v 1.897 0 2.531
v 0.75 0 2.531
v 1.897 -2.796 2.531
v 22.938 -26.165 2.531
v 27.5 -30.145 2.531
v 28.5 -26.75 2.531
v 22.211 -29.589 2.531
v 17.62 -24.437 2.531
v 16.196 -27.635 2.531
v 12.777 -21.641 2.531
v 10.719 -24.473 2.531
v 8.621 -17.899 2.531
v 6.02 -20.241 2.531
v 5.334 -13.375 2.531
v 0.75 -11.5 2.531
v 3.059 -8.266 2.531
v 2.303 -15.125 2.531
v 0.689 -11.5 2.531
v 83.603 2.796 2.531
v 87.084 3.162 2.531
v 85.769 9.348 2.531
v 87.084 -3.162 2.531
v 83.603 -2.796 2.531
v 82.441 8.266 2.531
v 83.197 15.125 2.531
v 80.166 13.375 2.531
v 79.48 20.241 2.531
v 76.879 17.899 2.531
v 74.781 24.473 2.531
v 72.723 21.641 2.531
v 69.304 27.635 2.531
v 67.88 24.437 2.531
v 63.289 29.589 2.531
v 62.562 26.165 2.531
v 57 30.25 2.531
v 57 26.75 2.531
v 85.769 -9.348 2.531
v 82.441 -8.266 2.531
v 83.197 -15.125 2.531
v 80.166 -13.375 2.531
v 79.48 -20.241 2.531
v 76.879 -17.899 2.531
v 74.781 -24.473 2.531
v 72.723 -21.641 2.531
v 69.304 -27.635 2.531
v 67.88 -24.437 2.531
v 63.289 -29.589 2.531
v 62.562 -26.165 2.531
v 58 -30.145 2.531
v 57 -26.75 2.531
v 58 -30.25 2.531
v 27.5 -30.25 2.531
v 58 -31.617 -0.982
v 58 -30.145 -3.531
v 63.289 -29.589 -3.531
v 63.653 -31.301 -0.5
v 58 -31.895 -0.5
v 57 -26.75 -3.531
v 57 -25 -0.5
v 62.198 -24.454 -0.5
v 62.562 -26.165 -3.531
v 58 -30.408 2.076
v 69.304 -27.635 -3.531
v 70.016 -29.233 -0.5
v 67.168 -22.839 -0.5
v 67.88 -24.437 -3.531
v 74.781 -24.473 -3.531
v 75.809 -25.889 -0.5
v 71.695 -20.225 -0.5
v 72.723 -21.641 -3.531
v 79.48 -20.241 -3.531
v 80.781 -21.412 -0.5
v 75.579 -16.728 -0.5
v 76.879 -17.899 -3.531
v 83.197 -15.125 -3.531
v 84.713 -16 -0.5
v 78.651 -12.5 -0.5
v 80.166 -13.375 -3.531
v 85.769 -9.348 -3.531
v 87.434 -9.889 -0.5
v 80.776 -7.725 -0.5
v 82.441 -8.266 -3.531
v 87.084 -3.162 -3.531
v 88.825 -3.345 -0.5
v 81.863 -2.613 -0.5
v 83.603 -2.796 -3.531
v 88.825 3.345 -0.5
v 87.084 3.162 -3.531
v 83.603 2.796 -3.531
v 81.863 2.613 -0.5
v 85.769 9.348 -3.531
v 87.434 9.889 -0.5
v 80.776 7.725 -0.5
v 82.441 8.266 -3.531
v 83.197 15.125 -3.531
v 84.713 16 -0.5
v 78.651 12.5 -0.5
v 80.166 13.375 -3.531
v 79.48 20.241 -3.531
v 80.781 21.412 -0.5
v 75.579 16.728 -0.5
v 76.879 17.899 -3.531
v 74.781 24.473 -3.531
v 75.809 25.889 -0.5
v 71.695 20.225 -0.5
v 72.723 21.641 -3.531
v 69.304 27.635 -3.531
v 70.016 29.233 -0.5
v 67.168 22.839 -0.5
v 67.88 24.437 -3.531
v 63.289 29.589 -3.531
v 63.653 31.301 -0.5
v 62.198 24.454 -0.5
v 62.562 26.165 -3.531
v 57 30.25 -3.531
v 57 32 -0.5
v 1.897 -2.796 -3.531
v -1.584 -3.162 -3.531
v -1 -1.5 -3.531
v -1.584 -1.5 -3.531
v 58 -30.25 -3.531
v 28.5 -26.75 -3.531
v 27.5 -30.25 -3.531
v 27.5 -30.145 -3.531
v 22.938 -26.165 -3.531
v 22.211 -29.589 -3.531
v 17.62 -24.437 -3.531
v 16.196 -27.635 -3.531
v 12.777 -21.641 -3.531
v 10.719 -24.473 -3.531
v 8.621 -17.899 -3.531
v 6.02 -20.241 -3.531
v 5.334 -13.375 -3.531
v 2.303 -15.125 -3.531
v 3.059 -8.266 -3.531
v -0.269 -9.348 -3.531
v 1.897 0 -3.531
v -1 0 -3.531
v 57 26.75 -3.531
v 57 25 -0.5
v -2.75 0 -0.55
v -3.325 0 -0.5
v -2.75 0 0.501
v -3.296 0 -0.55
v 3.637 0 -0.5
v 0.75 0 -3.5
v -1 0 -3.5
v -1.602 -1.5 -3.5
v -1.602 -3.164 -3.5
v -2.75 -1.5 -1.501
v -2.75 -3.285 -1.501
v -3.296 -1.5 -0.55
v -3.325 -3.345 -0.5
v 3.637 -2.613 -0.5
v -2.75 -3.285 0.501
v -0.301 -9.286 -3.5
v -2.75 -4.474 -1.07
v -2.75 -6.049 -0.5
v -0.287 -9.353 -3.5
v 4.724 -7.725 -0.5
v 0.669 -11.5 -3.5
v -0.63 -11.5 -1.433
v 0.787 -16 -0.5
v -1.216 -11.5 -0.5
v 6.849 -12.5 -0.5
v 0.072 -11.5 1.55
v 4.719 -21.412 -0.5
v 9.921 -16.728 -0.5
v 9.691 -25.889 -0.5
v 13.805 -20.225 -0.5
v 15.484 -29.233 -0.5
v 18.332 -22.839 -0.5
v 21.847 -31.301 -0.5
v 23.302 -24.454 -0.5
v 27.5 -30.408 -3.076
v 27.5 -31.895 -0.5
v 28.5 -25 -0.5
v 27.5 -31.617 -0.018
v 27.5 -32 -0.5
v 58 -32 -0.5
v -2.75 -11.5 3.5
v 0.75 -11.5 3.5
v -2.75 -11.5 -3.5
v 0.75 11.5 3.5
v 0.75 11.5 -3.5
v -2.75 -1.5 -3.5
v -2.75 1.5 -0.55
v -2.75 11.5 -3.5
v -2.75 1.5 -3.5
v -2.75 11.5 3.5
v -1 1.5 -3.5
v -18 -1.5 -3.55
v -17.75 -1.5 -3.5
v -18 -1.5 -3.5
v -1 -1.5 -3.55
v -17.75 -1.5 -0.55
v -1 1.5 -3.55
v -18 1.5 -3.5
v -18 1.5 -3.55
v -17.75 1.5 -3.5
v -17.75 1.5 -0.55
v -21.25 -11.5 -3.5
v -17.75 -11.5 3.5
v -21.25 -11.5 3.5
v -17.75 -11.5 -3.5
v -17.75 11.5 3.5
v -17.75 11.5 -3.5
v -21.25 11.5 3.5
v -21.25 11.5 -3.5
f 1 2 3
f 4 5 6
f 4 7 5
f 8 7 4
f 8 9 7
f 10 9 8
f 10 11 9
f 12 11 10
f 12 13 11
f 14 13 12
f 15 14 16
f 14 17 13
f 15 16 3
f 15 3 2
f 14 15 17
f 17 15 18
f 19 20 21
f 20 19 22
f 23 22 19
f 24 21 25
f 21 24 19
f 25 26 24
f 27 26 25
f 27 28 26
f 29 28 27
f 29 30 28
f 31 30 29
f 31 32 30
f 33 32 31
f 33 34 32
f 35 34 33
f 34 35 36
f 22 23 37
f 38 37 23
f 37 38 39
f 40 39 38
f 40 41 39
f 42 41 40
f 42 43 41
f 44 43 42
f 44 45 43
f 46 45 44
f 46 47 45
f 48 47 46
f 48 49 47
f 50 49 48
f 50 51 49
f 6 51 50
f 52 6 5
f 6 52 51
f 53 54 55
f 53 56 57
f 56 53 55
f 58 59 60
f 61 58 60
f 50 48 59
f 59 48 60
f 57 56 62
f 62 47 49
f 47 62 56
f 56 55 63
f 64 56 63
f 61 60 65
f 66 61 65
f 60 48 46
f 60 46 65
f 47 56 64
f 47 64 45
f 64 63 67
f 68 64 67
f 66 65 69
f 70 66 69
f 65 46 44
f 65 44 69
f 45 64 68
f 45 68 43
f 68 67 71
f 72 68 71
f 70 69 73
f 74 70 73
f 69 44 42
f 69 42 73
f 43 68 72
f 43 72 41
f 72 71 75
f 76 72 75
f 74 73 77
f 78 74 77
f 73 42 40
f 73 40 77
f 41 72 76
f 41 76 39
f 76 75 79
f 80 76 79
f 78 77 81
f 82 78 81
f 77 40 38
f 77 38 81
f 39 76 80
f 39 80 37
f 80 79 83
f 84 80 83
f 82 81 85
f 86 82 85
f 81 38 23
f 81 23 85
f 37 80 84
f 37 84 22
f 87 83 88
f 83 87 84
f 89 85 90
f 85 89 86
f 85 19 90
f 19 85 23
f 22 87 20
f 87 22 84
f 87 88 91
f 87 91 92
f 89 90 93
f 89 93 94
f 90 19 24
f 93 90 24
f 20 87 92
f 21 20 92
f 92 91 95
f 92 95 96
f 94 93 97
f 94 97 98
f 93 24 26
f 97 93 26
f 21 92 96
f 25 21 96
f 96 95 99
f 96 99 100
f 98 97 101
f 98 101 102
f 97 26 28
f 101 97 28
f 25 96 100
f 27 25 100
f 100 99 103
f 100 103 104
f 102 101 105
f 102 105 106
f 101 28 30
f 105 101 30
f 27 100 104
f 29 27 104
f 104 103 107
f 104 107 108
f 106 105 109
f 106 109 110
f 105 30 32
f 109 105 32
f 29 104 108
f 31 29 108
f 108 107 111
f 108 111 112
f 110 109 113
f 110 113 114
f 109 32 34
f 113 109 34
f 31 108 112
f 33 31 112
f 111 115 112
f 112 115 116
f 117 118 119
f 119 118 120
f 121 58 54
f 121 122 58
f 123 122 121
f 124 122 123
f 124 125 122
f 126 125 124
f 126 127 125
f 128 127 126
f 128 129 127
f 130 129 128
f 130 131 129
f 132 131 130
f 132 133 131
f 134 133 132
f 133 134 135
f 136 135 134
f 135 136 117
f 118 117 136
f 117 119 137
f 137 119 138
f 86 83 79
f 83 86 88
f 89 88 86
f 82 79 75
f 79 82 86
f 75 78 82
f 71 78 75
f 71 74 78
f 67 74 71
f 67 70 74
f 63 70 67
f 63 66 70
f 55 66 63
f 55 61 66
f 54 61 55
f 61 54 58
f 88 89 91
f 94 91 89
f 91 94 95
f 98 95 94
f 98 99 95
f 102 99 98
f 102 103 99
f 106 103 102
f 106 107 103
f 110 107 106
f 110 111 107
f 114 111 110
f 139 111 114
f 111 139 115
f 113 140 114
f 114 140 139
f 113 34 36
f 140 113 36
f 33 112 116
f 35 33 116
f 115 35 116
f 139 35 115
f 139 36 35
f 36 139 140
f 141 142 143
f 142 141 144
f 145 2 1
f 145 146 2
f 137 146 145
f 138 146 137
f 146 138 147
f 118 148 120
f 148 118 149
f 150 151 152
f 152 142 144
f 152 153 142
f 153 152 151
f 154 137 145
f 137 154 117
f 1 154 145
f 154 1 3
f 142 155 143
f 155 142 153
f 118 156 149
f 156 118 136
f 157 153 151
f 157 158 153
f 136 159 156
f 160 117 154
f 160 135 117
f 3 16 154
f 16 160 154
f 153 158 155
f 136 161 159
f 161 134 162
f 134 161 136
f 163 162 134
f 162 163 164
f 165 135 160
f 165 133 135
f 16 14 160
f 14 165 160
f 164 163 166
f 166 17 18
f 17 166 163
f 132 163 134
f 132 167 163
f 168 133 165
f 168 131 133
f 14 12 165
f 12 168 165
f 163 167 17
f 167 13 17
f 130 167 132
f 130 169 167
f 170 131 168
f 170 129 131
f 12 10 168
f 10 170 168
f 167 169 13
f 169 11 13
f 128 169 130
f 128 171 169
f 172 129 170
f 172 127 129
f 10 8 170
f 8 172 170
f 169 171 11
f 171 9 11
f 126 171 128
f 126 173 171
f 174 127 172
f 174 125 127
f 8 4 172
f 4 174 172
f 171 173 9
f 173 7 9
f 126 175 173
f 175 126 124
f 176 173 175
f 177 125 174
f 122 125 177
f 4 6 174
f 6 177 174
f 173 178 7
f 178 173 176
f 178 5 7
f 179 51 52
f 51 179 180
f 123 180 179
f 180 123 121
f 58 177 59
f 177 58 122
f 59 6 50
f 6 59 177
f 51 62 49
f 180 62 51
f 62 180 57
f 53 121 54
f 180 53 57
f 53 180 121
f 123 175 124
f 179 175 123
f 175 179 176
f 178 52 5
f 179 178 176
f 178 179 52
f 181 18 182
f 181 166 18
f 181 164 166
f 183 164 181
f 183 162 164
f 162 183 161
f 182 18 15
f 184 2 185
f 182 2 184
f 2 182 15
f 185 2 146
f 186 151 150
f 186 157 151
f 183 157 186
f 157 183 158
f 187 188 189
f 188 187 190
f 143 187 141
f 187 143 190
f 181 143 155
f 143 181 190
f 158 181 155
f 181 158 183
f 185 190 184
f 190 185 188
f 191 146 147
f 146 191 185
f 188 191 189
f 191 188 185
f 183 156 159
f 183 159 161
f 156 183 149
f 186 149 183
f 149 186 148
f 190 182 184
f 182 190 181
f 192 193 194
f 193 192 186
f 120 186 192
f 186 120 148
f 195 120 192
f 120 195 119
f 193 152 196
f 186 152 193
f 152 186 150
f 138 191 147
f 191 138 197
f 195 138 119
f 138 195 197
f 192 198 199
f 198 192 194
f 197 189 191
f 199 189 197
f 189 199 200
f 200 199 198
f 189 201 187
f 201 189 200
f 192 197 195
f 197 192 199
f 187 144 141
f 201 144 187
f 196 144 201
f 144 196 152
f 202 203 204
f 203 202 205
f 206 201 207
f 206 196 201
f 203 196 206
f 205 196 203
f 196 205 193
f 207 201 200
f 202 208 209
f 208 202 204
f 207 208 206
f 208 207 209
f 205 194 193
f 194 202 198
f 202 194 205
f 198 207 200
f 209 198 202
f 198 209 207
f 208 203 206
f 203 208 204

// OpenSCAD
//http://www.thingiverse.com/thing:20016/#files

length = 375;
height = 85;

bar_d = 7;
bar_r = bar_d / 2;

bend_d = 38;
bend_r = bend_d / 2;

pin_d = bar_d;
pin_buffer = 5;
plate_h = pin_d * 2 + pin_buffer + 4;

bottom_l = length /2 - bend_r - plate_h / 2;

corner_a = atan((height - bend_d)/ bottom_l);

top_l = sqrt((bottom_l + tan(corner_a)*bend_r) * (bottom_l + tan(corner_a)*bend_r) + (height - bend_d)*(height - bend_d));


bend_a = 180 - corner_a;


plate_w = pin_d * 2;

hook_d = 57;
hook_r = hook_d / 2;

module ring(outer, inner) {
	rotate_extrude() translate([inner, 0, 0]) circle(r = outer, $fn = 6);
}

module partial_ring(outer, inner, deg) {
  assign(compliment = 360 - deg) {

    difference() {
      ring(outer, inner);

      if (compliment < 90) {
        translate([0, 0, -outer])
          linear_extrude(height = outer * 2)
            polygon(points = [[0,0],
                              [-(inner + outer), 0], 
                              [-(inner + outer),(inner + outer) * tan(compliment)]]);
      }
      else if (compliment < 180) {
        translate([-(inner + outer), 0, -outer])
          cube(size = [inner + outer, inner + outer, outer*2], center = false);

        translate([0, 0, -outer])
        linear_extrude(height = outer * 2)
          polygon(points = [[0,0],
                            [0, (inner + outer)], 
                            [(inner + outer) * tan(compliment - 90),
				(inner + outer),]]);
      }
      else if (compliment < 270) {
        translate([-(inner + outer), 0, -outer])
          cube(size = [(inner + outer)*2, inner + outer, outer*2], center = false);

        translate([0, 0, -outer])
        linear_extrude(height = outer * 2)
          polygon(points = [[0,0],
                            [(inner + outer), 0], 
                            [(inner + outer),
				-(inner + outer) * tan(compliment - 180)]]);

      }
      else {
        translate([-(inner + outer), 0, -outer])
          cube(size = [(inner + outer)*2, inner + outer, outer*2], center = false);

	translate([0, -(inner + outer), -outer])
	  cube(size = [inner + outer, inner + outer, outer*2], center = false);
	  
        translate([0, 0, -outer])
        linear_extrude(height = outer * 2)
          polygon(points = [[0,0],
                            [0, -(inner + outer)], 
                            [(inner + outer) * tan(90 - (compliment - 180)),
                              -(inner + outer)]]);
      }
    }
  }
}

module pin(height, rad) {
  union() {
    cylinder(h = height, r = rad, center = false, $fn = 20);
    translate([-rad, 0, 0])
      cylinder(h = height, r = 0.5, center = false, $fn = 5);
    translate([rad, 0, 0])
      cylinder(h = height, r = 0.5, center = false, $fn = 5);
    translate([0, -rad, 0])
      cylinder(h = height, r = 0.5, center = false, $fn = 5);
    translate([0, rad, 0])
      cylinder(h = height, r = 0.5, center = false, $fn = 5);
  }
}

module pinplate(plate_t, num_pins, pin_d) {
  assign(plate_w = pin_d * (num_pins * 2),
  
         pin_r = pin_d / 2) {

    difference() {
      union() {
        cube(size = [plate_w, plate_h, plate_t], center=false);
        for (i = [0:num_pins - 1]) {
          translate([pin_d + pin_d * i * 2, pin_d + pin_r + pin_buffer + 2, plate_t])
            pin(plate_t, pin_r);
        }
      }    

      for (i = [0:num_pins - 1]) {
	translate([pin_d + pin_d * i * 2, pin_r + 2, -1])
        cylinder(h = plate_t + 2, r = pin_r, center = false, $fn = 20);

/*	rotate(a = [0, 180, 0])
          pinhole(h = plate_t, r = pin_r, lh = plate_t / 3, lt = 1,
	          t = 0.3, tight = true);*/
      }
    }  
  }
}	   

module hangerside() {
  rotate(a = [270, 0, 0]) {
  cylinder(h=bottom_l, r = bar_r, $fn = 6);

  difference() {
    translate([bend_r, 0, 0])
      rotate(a = [0, corner_a, 0])
      translate([bend_r, 0, 0])
      cylinder(h=top_l, r = bar_r, $fn = 6);

    translate([height - 1 - bar_r, -bar_r, bottom_l - 1])
      cube(size = bar_d + 2);
  }


  translate([bend_r, 0, 0])
    rotate([90, 0, 0]) partial_ring(bar_r, bend_r, bend_a);
  }

  translate([height - bar_r * 3, bottom_l - 1, -bar_r + .5]){
    difference() {
      pinplate(bar_r, 1, pin_d);
      translate([-1, plate_h/2 - bar_r/2 , bar_r/2])
        cube(size = [plate_w + 2, bar_r, bar_r / 2 + 1], center=false);
  }
  linear_extrude(height = bar_r)
     polygon(points = [[0,0], [bar_r * 3, 0], [0, (1/tan(corner_a))* -(bar_r * 3)]]);
  }

  translate([-bar_r, bottom_l - 1, -bar_r + .5])
    pinplate(bar_r, 1, pin_d);
}

module hangerhook() {
  rotate(a = [-90, 0, -90]) {
  translate([0, 0.5, hook_r]) {
    translate([0, 0, hook_r])
      rotate(a = [-90, 0, 0])
      partial_ring(bar_r, hook_r, 180);

    translate([hook_r, 0, -1])
      cylinder(r = bar_r, h = hook_r + 2, $fn = 6);

    rotate(a = [90, 0, 180])
      partial_ring(bar_r, hook_r, 90);
  }
  translate([0, 0, -1])
  cube(size = [plate_h, bar_d, bar_r], center = true);
  translate([0, bar_r/2 + 0.3, -(plate_w + bar_d) / 2 + 1])
    cube(size = [bar_r - 0.5, bar_r - 0.5, plate_w + 3], center = true);
  translate([0, 0, -(plate_w + bar_r + 2)])
    cube(size = [plate_h, bar_d, bar_r], center = true);
  }
}

/**** Uncomment one of either the hanger side or hook ****/


//Uncomment to render a guide outline for mendel bed
module bed_guide() {
	bed_x=180;
	bed_y=190;
	difference() {
	  cube(size = [bed_x, bed_y, 1], center=true);
	  cube(size = [bed_x-2, bed_y-2, 3], center=true);
	}
}

//bed_guide();


//Uncomment to render the hook
hangerhook();

//Uncomment to render one side
//translate([-93, -65, 0])
  //rotate(a = [0, 0, -33])
  //hangerside();
